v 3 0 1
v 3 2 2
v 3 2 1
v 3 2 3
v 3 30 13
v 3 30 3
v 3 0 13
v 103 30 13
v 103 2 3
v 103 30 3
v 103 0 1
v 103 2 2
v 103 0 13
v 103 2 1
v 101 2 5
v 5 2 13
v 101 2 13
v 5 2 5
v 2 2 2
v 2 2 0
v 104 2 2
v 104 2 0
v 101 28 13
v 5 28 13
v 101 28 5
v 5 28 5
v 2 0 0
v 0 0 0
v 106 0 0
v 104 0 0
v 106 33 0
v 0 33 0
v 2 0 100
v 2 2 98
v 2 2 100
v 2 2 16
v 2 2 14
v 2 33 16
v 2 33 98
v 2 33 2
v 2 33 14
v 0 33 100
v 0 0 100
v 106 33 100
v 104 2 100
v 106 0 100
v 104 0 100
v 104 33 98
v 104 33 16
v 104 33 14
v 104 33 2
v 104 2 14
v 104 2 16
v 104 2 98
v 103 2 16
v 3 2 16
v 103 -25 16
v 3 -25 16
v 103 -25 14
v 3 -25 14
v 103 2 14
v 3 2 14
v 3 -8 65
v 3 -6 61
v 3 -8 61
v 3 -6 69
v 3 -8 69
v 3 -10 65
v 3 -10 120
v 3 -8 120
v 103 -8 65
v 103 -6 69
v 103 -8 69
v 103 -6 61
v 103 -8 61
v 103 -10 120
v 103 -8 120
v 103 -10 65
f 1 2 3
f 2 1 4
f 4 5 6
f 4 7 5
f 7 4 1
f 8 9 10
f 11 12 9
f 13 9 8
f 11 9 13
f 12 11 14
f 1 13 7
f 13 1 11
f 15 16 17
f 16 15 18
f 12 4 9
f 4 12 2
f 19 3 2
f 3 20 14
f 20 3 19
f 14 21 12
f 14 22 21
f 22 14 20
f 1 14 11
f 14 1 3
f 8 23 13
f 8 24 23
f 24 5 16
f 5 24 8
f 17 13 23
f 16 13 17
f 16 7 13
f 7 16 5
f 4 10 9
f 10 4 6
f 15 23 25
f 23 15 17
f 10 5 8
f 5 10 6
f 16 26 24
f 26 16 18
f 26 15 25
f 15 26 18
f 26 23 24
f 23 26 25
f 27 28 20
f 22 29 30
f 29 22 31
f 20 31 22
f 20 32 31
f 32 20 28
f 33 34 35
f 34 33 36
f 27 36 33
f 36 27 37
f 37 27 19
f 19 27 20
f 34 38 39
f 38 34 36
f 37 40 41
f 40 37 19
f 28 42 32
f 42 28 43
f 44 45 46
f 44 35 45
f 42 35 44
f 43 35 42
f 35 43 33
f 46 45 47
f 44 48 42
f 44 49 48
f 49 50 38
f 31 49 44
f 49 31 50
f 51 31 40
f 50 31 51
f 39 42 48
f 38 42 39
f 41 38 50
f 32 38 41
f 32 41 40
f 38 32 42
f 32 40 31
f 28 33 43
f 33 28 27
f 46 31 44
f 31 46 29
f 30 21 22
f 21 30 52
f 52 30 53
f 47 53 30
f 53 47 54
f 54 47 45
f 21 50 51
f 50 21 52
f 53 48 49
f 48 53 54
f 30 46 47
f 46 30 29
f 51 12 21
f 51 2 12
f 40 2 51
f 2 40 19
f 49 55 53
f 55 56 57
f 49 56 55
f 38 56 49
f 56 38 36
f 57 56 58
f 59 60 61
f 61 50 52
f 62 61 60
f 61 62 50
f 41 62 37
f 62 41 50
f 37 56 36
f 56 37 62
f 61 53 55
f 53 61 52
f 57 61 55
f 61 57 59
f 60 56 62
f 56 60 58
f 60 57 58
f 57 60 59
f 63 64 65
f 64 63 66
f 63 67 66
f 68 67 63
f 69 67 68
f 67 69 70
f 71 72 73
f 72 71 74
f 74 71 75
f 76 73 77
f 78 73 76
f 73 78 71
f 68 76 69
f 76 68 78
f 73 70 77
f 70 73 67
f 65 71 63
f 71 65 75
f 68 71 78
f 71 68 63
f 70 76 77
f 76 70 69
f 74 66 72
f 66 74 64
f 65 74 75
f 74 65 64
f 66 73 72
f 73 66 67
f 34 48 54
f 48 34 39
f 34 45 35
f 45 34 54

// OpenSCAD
$fn=50;

WOOD_THICKNESS = 2;
ALLOWANCE = 1;

module desk(DRAWER_FRONT_DECK_ANGLE = 0, DRAWER_OFFSET_DEPTH = 0, TOP_TOP_OFFSET = 20, PANEL_TOP_ANGLE = 0)
{
    module drawer(width, depth, height, angle = 0, openDepth = 0)
    {
        ratio = 2;
        
        // Planche de droite
        translate([width - WOOD_THICKNESS, WOOD_THICKNESS, height])
            rotate([0, 90, 0])
                cube([height, depth - WOOD_THICKNESS, WOOD_THICKNESS]);
        
        // Planche de gauche
        translate([0, WOOD_THICKNESS, height])
            rotate([0, 90, 0])
                cube([height, depth - WOOD_THICKNESS, WOOD_THICKNESS]);
        
        // Planche du bas
        translate([WOOD_THICKNESS, WOOD_THICKNESS, 0])
            cube([width - 2 * WOOD_THICKNESS, depth - WOOD_THICKNESS, WOOD_THICKNESS]);
        
        // Planche du fond
        translate([WOOD_THICKNESS, depth, WOOD_THICKNESS])
            rotate([90, 0, 0])
                cube([width - 2 * WOOD_THICKNESS, height - WOOD_THICKNESS, WOOD_THICKNESS]);
                
        // Planche du devant
        /* translate([WOOD_THICKNESS, WOOD_THICKNESS, WOOD_THICKNESS])
            rotate([90, 0, 0])
                cube([width - 2 * WOOD_THICKNESS, (height - 2 * WOOD_THICKNESS) / ratio, WOOD_THICKNESS]); */
                
        frontDeckHeight = (height + WOOD_THICKNESS + 2 * RAIL_THICKNESS - 2 * ALLOWANCE) / ratio;
        
        module frontDeck(angle)
        {
            translate([- RAIL_THICKNESS + ALLOWANCE, WOOD_THICKNESS, - WOOD_THICKNESS - RAIL_THICKNESS + ALLOWANCE])
                rotate([90, 0, 0])
                    cube([width + 2 * RAIL_THICKNESS - 2 * ALLOWANCE, frontDeckHeight, WOOD_THICKNESS]);
            translate([-RAIL_THICKNESS + ALLOWANCE, 0, frontDeckHeight - WOOD_THICKNESS - RAIL_THICKNESS])
                rotate([180 + angle, 0, 0])
                    translate([0, 0, -frontDeckHeight - ALLOWANCE])
                        rotate([90, 0, 0])
                            cube([width + 2 * RAIL_THICKNESS - 2 * ALLOWANCE, frontDeckHeight, WOOD_THICKNESS]);
        }
        
        frontDeck(angle);
    }

    module rail(width, depth, height)
    {
        color([0, 1, 0])
            cube([width, depth, height]);
    }


    HEIGHT = 100;
    DESK_DEPTH = 60;

    DRAWER_WIDTH = 100;
    DRAWER_DEPTH = 30;
    DRAWER_HEIGHT = 10;

    RAIL_THICKNESS = 1;

    DEPTH = DRAWER_DEPTH + RAIL_THICKNESS + WOOD_THICKNESS;
    WIDTH = DRAWER_WIDTH + 2 * RAIL_THICKNESS + 2 * WOOD_THICKNESS;


    PANEL_TOP_HEIGHT = DESK_DEPTH - DEPTH;

    // Planche de gauche
    translate([0, 0, HEIGHT])
        rotate([0, 90, 0])
            cube([HEIGHT, DEPTH, WOOD_THICKNESS]);

    // Planche de droite
    translate([WIDTH - WOOD_THICKNESS, 0, HEIGHT])
        rotate([0, 90, 0])
            cube([HEIGHT, DEPTH, WOOD_THICKNESS]);

    // Planche du bas
    translate([WOOD_THICKNESS, WOOD_THICKNESS, 0])
        cube([WIDTH - 2 * WOOD_THICKNESS, DEPTH - WOOD_THICKNESS, WOOD_THICKNESS]);
        
    // Planche du haut
    translate([WOOD_THICKNESS, WOOD_THICKNESS, DRAWER_HEIGHT + 2 * RAIL_THICKNESS + WOOD_THICKNESS])
        cube([WIDTH - 2 * WOOD_THICKNESS, DEPTH - WOOD_THICKNESS, WOOD_THICKNESS]);

    // Tiroir
    color([1, 1, 0.5])
        translate([WOOD_THICKNESS + RAIL_THICKNESS, - DRAWER_OFFSET_DEPTH, WOOD_THICKNESS + RAIL_THICKNESS])
            drawer(DRAWER_WIDTH, DRAWER_DEPTH, DRAWER_HEIGHT, DRAWER_FRONT_DECK_ANGLE);
            
    /* color([0.9, 1, 0.9])
        translate([WOOD_THICKNESS, -PANEL_TOP_HEIGHT + WOOD_THICKNESS, DRAWER_HEIGHT + 2 * RAIL_THICKNESS + WOOD_THICKNESS])
                cube([WIDTH - 2 * WOOD_THICKNESS, PANEL_TOP_HEIGHT, WOOD_THICKNESS]); */

    color([0, 1, 0])
    translate([WOOD_THICKNESS + ALLOWANCE, WOOD_THICKNESS, DRAWER_HEIGHT + 2 * WOOD_THICKNESS + 2 * RAIL_THICKNESS])
        rotate([-PANEL_TOP_ANGLE, 0, 0])
            translate([0, -PANEL_TOP_HEIGHT, -WOOD_THICKNESS])
                cube([WIDTH - 2 * WOOD_THICKNESS - 2 * ALLOWANCE, PANEL_TOP_HEIGHT, WOOD_THICKNESS]);

    translate([0, -TOP_TOP_OFFSET / 2, TOP_TOP_OFFSET])
        translate([WOOD_THICKNESS + ALLOWANCE, WOOD_THICKNESS, WOOD_THICKNESS + (DRAWER_HEIGHT + WOOD_THICKNESS + 2 * RAIL_THICKNESS + WOOD_THICKNESS) + PANEL_TOP_HEIGHT])
            rotate([90, 0, 0])
                cube([WIDTH - 2 * WOOD_THICKNESS - 2 * ALLOWANCE, HEIGHT - (DRAWER_HEIGHT + 2 * WOOD_THICKNESS + 2 * RAIL_THICKNESS + WOOD_THICKNESS) - PANEL_TOP_HEIGHT, WOOD_THICKNESS]);
                
    translate([0, -TOP_TOP_OFFSET / 2, TOP_TOP_OFFSET])
        translate([WOOD_THICKNESS + ALLOWANCE, 2 * WOOD_THICKNESS, WOOD_THICKNESS + (DRAWER_HEIGHT + WOOD_THICKNESS + 2 * RAIL_THICKNESS + WOOD_THICKNESS) + PANEL_TOP_HEIGHT - 2 * WOOD_THICKNESS])
            rotate([90, 0, 0])
                cube([WIDTH - 2 * WOOD_THICKNESS - 2 * ALLOWANCE, 4 * WOOD_THICKNESS, WOOD_THICKNESS]);
    
    translate([WOOD_THICKNESS, WOOD_THICKNESS, HEIGHT - WOOD_THICKNESS])
        cube([WIDTH - 2 * WOOD_THICKNESS, DEPTH - WOOD_THICKNESS, WOOD_THICKNESS]);

}

// https://www.leroymerlin.fr/produits/quincaillerie/quincaillerie-du-meuble/equerre-et-assemblage-du-meuble/equerre-assemblage/1-raccord-assemblage-acier-zingue-hettich-l-70-mm-70207592.html

module bracket(width = 1.50, depth=5, height=10, thickness = 0.20)
{   
    module triangle(width, depth, height)
    {
        translate([width, 0, 0])
            rotate([0, 270, 0])
                linear_extrude(width)
                    polygon([[0, 0], [0, depth], [height, depth]]);
    }
    
    difference()
    {
        triangle(width, depth, height);
        
        translate([thickness, -thickness, thickness])
            triangle(width, depth, height);
        
        holeDiameter = width - 5 * thickness;
        
        depthOffsets = [
            holeDiameter / 2 + 2 * thickness, 
            depth - holeDiameter - thickness
        ];
        for(depthOffset = depthOffsets)
        {
            translate([holeDiameter / 2 + 3 * thickness, depthOffset, - thickness])
                cylinder(d=holeDiameter, h=3*thickness);
        }
    }
}

//bracket();

// Tout fermé
//desk(0, 0, 0, 90);

// En mode piano
//desk(90 + 80, 30, 0, 90);

// En mode bureau
desk(0, 0, 20, 0);
